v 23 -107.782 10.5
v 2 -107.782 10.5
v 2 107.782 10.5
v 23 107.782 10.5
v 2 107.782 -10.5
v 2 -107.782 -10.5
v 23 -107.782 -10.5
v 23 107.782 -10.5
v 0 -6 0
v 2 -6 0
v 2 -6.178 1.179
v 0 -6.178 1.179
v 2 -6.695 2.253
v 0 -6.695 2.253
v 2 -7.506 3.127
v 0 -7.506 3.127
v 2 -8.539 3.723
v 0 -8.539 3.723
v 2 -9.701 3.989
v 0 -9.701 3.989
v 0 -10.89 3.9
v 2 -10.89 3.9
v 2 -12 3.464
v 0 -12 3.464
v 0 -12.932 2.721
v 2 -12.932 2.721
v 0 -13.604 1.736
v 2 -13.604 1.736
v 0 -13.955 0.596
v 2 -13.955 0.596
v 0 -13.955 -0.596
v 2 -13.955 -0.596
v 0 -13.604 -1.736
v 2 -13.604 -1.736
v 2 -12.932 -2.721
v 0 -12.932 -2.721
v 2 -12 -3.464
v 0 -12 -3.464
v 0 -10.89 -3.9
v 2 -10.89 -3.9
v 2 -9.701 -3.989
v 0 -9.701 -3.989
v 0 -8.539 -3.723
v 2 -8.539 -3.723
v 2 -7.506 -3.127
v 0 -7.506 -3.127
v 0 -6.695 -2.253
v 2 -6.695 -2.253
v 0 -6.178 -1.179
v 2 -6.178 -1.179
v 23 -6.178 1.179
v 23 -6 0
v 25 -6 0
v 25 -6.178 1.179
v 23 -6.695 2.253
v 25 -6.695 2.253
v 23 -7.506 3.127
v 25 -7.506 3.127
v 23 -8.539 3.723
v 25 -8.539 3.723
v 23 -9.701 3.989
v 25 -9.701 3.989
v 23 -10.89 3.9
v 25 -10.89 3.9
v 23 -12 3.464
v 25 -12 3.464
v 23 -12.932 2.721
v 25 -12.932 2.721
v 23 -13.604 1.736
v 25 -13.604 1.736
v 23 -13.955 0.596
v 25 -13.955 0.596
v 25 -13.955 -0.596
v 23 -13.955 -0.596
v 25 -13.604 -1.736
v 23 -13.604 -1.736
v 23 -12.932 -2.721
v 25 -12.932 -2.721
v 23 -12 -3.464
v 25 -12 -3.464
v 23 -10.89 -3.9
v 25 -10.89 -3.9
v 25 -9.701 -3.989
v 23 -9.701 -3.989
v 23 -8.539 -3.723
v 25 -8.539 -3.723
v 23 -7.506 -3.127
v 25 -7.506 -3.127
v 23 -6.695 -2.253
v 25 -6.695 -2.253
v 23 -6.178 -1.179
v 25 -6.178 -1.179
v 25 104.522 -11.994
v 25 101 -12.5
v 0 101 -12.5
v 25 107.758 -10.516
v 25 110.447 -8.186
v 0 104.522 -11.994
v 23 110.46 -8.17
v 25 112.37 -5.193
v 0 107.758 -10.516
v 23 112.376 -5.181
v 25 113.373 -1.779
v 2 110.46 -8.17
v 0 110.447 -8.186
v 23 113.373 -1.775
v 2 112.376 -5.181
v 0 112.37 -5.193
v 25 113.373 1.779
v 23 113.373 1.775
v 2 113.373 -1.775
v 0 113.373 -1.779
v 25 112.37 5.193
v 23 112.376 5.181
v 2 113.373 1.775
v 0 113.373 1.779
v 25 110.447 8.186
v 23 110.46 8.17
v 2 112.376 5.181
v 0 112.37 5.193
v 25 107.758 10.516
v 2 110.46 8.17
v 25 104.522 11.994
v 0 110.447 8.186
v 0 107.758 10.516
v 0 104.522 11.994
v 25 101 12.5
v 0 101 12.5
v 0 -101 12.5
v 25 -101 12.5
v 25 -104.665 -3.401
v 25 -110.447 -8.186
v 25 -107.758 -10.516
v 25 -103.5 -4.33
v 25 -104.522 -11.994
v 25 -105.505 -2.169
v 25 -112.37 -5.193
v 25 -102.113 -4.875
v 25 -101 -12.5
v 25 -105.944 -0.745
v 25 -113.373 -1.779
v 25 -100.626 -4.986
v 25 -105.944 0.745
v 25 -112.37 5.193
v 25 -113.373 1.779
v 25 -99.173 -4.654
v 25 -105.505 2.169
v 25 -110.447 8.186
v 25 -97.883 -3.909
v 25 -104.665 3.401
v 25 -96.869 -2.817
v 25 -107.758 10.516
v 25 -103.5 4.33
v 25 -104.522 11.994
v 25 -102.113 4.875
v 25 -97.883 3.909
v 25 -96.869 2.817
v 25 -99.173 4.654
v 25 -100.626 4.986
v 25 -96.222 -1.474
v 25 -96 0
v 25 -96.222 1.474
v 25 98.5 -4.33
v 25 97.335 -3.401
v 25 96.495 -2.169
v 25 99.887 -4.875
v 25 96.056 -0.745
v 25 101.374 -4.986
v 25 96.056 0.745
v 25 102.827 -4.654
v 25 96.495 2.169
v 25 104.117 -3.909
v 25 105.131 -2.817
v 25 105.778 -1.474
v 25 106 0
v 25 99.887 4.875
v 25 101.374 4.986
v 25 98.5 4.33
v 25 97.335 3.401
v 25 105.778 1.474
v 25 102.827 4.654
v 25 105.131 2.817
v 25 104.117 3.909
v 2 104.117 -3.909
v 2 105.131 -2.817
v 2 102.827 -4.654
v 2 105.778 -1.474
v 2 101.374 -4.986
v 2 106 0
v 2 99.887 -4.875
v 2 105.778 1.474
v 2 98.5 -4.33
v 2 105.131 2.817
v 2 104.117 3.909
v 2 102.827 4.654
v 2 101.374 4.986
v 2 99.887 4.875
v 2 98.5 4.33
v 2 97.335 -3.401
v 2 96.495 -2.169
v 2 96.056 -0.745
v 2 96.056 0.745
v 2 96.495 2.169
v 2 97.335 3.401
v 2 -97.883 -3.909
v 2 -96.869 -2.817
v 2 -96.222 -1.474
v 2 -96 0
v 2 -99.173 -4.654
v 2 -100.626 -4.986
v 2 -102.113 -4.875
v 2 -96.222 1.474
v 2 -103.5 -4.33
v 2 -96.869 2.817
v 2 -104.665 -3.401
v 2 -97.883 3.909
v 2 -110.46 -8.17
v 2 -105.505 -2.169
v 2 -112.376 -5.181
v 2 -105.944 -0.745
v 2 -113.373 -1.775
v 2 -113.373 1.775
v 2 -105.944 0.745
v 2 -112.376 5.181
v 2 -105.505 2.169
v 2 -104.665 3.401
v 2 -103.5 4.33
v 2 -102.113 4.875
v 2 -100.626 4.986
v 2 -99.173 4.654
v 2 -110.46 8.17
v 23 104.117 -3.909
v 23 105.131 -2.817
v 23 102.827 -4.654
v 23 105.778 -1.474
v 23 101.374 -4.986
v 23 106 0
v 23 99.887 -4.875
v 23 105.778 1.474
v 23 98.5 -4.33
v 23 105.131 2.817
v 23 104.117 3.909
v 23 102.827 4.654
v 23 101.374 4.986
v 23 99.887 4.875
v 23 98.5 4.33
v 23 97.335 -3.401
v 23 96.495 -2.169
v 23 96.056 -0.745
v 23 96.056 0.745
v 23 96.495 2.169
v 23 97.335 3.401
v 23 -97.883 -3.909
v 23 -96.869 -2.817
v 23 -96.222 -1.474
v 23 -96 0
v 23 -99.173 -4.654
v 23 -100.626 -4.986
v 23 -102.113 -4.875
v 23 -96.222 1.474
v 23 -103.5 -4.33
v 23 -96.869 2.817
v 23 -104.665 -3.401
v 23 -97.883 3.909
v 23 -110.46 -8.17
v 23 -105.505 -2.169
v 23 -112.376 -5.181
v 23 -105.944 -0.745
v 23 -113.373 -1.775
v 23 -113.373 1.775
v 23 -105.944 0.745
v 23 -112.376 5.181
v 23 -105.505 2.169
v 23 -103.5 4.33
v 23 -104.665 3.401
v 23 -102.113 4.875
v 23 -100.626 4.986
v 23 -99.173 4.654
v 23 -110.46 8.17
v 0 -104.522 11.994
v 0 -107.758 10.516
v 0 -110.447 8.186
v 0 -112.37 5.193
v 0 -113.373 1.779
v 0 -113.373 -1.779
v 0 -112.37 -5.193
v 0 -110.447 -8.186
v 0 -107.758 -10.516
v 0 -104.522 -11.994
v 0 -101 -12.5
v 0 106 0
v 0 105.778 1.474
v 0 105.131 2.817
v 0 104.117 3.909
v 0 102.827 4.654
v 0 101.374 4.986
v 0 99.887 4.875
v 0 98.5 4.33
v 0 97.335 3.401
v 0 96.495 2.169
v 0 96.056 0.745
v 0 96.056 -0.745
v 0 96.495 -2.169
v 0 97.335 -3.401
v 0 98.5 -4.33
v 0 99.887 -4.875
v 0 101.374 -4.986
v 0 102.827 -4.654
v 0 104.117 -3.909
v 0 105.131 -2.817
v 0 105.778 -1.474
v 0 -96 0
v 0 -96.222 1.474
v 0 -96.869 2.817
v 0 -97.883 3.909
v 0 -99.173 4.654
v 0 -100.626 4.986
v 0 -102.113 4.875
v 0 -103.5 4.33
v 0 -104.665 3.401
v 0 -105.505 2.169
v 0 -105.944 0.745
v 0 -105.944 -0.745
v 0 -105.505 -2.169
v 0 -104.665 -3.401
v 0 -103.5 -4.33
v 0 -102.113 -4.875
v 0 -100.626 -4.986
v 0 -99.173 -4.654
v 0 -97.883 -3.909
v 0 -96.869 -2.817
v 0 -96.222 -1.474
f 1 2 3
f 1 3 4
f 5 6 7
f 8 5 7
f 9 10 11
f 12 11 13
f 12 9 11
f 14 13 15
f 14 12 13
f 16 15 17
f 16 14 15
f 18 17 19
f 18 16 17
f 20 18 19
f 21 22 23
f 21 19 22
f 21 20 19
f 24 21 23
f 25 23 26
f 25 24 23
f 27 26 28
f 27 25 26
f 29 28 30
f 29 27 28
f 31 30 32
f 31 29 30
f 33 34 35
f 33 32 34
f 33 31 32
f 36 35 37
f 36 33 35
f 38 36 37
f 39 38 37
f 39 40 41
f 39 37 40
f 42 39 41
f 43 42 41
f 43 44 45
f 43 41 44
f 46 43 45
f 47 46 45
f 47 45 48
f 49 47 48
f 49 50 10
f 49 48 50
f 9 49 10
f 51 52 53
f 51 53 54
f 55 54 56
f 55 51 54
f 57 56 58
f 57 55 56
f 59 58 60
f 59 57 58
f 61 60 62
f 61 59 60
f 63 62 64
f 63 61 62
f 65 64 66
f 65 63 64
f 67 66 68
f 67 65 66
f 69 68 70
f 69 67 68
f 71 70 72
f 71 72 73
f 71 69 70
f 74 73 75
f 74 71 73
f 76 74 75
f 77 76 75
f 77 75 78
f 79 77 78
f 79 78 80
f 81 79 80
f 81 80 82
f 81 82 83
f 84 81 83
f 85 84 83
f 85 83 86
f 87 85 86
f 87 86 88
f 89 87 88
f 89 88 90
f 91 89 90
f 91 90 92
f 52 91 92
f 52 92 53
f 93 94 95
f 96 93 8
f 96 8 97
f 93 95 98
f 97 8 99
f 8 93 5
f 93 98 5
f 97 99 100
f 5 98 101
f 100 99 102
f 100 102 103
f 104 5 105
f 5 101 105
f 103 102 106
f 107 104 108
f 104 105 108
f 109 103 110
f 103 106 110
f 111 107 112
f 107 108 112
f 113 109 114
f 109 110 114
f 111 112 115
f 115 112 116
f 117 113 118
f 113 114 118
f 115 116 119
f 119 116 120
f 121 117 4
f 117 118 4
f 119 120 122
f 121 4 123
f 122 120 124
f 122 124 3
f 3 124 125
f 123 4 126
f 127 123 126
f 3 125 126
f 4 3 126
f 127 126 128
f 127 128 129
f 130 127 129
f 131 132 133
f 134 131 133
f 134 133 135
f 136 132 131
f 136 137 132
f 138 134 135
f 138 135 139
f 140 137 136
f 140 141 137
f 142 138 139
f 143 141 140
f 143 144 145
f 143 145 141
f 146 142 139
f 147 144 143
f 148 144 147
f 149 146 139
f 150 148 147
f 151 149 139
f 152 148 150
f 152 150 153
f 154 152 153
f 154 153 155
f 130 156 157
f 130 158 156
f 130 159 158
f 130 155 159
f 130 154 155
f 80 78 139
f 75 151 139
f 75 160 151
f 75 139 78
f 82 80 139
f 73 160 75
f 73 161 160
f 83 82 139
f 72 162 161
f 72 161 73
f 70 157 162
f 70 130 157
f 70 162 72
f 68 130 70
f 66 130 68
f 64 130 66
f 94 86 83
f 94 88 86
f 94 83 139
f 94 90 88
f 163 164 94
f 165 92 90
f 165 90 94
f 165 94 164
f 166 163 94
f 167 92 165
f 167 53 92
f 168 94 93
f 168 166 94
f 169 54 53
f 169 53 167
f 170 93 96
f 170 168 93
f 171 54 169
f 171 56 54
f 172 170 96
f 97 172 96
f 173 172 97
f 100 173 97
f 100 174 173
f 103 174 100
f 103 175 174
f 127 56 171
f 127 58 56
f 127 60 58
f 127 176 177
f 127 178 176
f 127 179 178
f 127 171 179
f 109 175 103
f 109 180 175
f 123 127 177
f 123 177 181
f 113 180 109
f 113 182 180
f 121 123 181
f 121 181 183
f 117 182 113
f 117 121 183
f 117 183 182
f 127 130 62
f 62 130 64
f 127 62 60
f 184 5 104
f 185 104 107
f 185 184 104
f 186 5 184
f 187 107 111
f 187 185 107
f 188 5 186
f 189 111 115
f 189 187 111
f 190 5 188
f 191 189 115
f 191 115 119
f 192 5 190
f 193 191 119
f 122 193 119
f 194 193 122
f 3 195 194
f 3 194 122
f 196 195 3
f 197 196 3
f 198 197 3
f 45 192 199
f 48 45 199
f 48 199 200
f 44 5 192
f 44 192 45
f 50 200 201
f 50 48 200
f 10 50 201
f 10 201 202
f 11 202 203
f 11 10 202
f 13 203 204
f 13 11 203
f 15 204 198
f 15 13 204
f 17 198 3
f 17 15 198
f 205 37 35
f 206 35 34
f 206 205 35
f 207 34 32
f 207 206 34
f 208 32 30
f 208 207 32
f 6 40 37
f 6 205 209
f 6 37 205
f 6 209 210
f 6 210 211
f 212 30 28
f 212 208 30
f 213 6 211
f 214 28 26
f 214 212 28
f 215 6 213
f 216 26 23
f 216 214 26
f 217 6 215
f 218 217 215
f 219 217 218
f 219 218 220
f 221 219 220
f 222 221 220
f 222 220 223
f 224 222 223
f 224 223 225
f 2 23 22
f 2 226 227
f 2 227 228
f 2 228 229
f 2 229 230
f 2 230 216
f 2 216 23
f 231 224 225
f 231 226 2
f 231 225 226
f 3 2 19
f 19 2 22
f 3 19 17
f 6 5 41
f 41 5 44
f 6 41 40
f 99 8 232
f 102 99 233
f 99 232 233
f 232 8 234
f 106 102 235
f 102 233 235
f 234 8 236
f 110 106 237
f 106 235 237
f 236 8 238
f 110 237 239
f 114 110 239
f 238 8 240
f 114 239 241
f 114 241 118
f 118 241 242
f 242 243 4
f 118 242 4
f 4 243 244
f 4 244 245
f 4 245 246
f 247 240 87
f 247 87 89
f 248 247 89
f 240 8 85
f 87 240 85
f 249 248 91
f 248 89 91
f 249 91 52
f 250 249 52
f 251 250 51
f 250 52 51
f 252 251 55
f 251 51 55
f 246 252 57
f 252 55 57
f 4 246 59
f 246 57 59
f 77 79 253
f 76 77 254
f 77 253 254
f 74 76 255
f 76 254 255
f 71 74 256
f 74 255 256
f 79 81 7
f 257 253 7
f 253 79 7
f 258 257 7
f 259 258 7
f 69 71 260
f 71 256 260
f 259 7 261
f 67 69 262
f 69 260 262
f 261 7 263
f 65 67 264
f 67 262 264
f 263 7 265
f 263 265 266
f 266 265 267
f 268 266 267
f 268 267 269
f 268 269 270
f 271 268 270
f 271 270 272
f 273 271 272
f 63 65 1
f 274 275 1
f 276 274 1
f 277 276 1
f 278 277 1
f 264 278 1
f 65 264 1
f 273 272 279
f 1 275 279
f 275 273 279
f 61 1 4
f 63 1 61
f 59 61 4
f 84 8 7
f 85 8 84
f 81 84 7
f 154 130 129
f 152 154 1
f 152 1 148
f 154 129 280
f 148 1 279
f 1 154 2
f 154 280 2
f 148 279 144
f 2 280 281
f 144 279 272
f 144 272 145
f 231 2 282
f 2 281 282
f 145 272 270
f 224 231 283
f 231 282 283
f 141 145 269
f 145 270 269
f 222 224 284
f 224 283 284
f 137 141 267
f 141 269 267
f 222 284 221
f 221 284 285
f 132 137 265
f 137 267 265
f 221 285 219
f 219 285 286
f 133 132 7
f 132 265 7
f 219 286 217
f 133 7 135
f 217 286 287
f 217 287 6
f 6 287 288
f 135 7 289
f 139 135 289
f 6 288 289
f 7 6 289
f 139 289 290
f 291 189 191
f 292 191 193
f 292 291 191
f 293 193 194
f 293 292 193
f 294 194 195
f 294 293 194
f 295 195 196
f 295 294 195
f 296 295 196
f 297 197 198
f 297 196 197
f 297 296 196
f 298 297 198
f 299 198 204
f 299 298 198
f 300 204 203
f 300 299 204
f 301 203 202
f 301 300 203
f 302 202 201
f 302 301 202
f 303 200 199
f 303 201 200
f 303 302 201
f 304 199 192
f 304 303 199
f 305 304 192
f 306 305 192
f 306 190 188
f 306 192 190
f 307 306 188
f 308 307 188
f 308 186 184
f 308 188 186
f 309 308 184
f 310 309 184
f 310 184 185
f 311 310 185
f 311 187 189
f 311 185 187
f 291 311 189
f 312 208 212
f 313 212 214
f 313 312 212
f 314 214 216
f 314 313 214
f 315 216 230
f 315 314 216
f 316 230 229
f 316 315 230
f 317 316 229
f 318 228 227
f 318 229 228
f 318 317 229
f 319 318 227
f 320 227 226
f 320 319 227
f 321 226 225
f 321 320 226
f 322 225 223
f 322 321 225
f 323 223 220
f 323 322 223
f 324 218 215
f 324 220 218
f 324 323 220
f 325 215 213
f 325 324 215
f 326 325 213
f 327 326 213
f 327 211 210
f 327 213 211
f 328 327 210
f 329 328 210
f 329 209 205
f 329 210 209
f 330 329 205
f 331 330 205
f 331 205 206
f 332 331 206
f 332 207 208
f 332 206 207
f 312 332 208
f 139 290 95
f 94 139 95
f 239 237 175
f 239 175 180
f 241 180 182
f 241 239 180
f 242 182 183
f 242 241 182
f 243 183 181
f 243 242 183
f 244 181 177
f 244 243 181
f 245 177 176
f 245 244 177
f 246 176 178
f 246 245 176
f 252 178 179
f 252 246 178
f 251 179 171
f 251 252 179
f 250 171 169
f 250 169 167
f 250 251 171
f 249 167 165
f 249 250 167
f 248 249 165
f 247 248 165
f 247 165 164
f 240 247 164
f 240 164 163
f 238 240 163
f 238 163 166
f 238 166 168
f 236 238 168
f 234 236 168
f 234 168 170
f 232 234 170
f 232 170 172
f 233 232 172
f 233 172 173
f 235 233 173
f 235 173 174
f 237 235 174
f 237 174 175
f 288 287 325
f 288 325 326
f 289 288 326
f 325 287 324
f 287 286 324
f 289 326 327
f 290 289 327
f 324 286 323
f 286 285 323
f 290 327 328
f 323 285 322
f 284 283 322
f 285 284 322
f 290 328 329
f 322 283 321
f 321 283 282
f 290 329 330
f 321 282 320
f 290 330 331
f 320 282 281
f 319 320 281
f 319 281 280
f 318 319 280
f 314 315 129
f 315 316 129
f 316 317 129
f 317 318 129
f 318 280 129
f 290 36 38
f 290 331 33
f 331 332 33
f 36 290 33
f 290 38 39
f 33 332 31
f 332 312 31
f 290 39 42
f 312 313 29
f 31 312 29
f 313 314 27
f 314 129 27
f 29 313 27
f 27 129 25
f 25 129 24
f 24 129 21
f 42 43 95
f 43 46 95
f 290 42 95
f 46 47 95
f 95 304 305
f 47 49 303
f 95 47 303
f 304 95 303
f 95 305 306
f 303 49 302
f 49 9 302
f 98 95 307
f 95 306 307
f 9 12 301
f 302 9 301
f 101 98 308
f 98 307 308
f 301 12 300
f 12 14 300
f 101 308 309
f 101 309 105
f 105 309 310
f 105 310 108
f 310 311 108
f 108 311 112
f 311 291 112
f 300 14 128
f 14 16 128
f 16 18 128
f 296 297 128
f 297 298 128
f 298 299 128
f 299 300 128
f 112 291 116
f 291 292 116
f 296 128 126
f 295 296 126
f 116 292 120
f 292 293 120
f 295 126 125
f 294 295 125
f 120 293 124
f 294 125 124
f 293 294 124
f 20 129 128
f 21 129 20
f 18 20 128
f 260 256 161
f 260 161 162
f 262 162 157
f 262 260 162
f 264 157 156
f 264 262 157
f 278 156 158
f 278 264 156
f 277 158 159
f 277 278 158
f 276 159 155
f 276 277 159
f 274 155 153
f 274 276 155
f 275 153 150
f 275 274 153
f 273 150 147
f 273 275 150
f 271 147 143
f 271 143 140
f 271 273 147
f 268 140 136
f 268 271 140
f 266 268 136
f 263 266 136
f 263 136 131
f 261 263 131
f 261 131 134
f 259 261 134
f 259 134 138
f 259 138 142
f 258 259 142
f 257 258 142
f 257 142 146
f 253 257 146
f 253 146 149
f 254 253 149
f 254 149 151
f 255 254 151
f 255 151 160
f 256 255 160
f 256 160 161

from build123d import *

# Parameters (mm, degrees)
F0_R          = 5
F0_R_2        = 4
F1_DEPTH      = 25
F2_W          = 21
F2_H          = 21
F3_DEPTH      = 113.501
F3_DEPTH_BACK = 113.501


with BuildPart() as f1:
    # F0 (on Right) → F1 (new body)
    with BuildSketch(Plane.YZ):
        with BuildLine():
            ThreePointArc((101, -12.5), (113.5, 0), (101, 12.5))
            Line((101, 12.5), (-101, 12.5))
            ThreePointArc((-101, 12.5), (-113.5, 0), (-101, -12.5))
            Line((-101, -12.5), (101, -12.5))
        make_face()
        with Locations((-101, 0)):
            Circle(F0_R, mode=Mode.SUBTRACT)
        with Locations((-10, 0)):
            Circle(F0_R_2, mode=Mode.SUBTRACT)
        with Locations((101, 0)):
            Circle(F0_R, mode=Mode.SUBTRACT)
    extrude(amount=F1_DEPTH)

    # F2 (on Front) → F3 (cut, two sides)
    with BuildSketch(Plane.XZ) as f3_sk:
        with Locations((12.5, 0)):
            Rectangle(F2_W, F2_H)
    extrude(amount=-F3_DEPTH, mode=Mode.SUBTRACT)
    extrude(f3_sk.sketch, amount=F3_DEPTH_BACK, mode=Mode.SUBTRACT)


solid = f1.part
